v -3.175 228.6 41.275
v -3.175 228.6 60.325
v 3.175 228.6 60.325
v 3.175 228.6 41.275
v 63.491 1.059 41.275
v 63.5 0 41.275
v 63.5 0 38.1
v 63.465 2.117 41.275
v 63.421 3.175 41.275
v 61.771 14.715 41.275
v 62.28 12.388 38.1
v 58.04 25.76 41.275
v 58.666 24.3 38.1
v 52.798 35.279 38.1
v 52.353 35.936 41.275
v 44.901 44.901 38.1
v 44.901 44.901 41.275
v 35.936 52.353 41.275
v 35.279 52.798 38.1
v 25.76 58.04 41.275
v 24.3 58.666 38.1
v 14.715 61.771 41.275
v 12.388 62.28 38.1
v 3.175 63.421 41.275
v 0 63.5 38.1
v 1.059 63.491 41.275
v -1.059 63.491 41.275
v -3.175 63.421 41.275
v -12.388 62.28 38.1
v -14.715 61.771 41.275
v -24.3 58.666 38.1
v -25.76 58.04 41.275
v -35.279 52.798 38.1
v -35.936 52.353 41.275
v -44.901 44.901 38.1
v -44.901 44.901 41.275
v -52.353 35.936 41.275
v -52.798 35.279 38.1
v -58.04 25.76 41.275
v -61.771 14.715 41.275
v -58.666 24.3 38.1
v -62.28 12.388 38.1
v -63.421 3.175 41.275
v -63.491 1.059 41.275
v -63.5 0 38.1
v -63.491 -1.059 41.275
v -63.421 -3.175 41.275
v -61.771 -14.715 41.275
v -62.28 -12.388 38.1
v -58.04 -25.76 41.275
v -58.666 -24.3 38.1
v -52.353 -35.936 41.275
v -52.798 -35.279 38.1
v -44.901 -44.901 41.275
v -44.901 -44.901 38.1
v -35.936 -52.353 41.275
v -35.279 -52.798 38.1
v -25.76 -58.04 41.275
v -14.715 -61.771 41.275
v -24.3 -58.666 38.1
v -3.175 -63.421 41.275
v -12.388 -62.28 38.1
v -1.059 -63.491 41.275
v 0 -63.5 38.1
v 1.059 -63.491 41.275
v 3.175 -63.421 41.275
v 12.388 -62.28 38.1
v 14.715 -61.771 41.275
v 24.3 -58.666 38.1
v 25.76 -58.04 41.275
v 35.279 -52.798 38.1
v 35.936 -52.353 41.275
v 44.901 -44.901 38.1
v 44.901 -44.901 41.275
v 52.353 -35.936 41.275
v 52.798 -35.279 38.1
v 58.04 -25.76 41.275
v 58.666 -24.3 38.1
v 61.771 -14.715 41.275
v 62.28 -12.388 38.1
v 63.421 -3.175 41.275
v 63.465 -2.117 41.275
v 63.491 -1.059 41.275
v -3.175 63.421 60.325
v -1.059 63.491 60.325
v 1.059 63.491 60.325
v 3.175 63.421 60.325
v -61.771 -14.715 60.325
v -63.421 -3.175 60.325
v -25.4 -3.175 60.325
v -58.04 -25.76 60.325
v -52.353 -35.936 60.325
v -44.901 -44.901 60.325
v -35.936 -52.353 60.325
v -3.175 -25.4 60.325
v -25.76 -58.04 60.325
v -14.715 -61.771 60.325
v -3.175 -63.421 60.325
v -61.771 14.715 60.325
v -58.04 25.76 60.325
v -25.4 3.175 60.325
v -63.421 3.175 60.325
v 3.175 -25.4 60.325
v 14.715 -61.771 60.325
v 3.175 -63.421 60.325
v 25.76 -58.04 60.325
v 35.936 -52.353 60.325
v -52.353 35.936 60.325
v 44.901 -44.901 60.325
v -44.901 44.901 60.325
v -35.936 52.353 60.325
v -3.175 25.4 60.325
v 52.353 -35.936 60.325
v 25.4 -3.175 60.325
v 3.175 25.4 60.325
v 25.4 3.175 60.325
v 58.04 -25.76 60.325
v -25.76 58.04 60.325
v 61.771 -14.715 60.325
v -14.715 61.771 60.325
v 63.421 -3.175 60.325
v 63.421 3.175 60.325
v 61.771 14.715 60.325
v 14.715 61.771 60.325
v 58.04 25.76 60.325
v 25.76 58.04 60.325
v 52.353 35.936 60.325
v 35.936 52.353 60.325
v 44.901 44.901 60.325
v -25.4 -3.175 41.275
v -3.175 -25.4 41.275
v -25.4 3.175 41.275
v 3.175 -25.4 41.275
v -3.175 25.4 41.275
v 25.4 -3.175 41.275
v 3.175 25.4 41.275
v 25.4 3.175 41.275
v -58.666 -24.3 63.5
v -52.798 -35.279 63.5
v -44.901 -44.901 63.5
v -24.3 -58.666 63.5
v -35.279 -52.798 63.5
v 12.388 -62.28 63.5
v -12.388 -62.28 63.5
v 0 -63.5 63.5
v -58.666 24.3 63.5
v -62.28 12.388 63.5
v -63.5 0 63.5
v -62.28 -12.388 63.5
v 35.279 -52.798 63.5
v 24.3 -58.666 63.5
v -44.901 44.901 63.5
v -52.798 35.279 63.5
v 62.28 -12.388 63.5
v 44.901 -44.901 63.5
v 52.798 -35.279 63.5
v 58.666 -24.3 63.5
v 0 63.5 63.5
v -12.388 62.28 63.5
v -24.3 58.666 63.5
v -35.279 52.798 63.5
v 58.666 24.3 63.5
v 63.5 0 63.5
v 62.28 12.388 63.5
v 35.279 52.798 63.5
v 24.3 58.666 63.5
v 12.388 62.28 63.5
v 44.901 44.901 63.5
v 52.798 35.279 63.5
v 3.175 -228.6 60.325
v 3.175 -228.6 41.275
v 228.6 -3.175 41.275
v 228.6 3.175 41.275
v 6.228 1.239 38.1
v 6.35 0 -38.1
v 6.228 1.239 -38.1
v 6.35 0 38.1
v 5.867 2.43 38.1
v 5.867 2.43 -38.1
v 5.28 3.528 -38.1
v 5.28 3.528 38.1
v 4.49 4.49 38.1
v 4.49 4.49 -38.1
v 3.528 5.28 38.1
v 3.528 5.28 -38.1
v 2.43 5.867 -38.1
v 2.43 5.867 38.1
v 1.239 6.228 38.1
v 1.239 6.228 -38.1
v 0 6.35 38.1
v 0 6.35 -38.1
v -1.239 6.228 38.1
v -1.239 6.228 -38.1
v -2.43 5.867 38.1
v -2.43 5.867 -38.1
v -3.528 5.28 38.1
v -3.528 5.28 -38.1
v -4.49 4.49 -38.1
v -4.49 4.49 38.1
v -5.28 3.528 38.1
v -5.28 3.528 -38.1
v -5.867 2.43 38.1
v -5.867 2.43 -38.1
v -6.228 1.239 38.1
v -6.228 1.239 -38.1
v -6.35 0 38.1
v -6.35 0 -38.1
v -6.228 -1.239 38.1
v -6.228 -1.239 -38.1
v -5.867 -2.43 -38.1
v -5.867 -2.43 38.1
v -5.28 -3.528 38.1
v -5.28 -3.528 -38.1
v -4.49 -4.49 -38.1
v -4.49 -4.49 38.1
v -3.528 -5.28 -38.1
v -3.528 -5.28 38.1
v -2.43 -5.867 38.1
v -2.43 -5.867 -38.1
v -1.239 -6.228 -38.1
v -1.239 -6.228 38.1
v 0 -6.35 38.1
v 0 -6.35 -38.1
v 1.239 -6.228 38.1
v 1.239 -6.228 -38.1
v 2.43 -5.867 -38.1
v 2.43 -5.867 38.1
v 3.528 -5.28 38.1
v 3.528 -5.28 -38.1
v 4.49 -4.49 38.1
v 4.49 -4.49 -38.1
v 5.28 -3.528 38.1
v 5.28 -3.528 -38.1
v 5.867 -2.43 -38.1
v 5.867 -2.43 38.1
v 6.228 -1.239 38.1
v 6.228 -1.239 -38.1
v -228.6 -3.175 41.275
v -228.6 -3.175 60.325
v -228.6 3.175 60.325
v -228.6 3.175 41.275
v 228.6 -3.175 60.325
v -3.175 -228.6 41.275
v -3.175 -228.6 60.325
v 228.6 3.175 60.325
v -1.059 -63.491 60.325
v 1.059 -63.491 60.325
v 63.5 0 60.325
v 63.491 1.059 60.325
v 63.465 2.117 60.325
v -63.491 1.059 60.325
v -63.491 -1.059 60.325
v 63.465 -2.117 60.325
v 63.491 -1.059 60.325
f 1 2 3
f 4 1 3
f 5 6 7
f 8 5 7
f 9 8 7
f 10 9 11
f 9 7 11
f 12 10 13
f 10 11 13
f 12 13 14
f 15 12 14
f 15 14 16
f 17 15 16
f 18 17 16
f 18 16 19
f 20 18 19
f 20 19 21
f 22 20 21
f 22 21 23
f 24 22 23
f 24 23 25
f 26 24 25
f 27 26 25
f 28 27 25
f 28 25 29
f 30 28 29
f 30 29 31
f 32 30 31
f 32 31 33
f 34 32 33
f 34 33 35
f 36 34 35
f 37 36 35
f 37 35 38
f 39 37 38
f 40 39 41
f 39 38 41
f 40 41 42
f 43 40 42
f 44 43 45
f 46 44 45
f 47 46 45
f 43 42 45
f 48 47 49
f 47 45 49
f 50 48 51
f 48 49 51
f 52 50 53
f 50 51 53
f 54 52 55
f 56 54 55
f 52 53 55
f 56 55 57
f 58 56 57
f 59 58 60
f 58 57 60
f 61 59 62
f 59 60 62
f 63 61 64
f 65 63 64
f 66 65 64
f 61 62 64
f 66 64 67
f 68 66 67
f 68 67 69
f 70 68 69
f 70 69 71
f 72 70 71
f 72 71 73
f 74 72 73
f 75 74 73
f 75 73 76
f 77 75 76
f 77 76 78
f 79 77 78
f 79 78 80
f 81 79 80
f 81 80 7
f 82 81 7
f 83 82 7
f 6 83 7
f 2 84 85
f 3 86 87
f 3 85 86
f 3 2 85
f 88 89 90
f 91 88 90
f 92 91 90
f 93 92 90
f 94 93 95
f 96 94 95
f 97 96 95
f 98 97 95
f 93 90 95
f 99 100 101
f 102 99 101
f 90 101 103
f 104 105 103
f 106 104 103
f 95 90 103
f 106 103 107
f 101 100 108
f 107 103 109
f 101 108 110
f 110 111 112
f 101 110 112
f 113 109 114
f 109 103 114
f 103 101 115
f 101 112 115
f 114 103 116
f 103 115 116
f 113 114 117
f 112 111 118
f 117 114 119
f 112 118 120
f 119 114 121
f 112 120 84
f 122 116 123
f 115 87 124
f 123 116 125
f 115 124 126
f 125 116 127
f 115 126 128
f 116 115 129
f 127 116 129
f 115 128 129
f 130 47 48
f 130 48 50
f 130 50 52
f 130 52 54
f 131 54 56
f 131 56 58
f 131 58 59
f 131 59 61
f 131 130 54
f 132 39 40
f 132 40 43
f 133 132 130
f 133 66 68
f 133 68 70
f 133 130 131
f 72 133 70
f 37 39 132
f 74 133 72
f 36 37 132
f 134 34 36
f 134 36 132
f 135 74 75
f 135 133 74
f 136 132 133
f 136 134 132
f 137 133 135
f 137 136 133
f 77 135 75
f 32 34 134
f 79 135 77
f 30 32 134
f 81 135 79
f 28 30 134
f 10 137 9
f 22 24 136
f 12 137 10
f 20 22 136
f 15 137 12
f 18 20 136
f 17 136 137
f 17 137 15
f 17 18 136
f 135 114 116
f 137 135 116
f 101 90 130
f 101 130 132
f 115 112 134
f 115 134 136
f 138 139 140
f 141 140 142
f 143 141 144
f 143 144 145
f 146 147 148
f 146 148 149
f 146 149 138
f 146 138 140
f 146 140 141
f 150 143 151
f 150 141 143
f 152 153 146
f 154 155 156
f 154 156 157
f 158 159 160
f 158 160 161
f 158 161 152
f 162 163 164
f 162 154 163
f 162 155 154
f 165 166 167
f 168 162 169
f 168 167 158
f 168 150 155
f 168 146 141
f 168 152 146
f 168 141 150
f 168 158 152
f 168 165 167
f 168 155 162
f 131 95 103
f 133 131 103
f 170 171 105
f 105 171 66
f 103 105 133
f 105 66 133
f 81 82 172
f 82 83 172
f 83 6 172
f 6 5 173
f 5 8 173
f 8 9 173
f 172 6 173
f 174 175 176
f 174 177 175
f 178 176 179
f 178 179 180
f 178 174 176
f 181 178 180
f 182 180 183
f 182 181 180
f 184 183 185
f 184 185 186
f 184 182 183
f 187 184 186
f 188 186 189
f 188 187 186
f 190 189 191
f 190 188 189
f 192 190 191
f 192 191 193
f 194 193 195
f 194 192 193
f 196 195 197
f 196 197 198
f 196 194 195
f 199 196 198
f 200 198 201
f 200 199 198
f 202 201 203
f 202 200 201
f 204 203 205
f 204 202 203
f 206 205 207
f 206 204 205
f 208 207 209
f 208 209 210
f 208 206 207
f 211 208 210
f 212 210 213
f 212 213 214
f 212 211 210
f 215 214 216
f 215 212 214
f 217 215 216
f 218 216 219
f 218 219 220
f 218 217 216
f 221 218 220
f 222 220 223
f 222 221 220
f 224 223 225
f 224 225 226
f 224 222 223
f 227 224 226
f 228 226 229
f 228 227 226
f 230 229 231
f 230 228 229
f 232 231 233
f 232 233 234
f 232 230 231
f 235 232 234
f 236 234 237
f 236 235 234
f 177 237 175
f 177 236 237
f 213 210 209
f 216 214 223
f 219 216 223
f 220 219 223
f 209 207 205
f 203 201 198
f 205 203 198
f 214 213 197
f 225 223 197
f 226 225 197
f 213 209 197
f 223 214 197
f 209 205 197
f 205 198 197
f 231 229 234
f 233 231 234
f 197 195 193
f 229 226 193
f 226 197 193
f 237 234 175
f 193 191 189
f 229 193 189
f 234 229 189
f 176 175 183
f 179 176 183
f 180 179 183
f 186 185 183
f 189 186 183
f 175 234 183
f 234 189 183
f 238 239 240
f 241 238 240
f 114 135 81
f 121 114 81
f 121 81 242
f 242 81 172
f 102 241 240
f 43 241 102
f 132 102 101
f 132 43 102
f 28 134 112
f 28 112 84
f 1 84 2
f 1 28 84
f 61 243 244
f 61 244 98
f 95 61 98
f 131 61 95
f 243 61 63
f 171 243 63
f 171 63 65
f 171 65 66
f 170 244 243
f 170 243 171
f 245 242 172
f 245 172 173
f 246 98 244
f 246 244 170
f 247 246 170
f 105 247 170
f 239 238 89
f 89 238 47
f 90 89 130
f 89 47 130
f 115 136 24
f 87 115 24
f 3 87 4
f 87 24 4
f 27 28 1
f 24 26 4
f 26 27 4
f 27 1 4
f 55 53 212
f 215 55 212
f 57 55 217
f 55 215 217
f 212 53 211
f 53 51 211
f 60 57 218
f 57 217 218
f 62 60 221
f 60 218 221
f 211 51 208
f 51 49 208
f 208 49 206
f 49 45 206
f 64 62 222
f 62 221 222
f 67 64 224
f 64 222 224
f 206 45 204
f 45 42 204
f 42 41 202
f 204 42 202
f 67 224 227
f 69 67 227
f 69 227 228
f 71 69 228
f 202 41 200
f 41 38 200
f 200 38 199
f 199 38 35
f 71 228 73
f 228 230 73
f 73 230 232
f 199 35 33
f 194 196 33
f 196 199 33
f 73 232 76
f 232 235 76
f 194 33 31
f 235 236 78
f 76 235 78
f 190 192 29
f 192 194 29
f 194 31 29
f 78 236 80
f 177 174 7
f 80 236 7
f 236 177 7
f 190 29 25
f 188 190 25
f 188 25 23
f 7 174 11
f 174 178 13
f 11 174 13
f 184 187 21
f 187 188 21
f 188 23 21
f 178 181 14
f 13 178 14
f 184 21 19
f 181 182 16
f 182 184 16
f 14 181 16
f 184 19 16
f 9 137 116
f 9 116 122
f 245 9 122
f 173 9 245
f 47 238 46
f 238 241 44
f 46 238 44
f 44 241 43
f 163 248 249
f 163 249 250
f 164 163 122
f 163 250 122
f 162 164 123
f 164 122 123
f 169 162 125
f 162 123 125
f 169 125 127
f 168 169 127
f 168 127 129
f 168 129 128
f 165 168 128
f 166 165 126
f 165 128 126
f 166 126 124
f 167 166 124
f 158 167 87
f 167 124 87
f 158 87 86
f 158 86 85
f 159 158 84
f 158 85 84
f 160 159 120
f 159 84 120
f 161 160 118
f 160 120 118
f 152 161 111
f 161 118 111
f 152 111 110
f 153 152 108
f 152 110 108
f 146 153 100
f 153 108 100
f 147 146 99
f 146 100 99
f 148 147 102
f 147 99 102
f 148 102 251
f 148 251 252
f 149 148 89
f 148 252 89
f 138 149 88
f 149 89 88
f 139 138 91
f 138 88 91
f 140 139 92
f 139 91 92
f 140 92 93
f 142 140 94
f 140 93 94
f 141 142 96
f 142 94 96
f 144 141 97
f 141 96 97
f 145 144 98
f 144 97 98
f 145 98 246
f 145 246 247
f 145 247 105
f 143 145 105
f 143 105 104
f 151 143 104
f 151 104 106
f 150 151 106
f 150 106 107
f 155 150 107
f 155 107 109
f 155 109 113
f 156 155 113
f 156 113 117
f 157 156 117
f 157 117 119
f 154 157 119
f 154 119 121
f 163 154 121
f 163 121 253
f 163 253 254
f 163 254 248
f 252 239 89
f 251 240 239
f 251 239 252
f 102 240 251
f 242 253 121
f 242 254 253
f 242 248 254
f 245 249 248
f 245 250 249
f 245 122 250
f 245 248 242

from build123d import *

# Parameters (mm, degrees)
F0_R     = 6.35
F1_DEPTH = 38.1
F2_R     = 63.5
F3_DEPTH = 3.175
F4_W     = 6.35
F4_H     = 203.2
F4_W_2   = 203.2
F4_H_2   = 6.35
F5_DEPTH = 19.05
F6_R     = 63.5
F7_DEPTH = 3.175


with BuildPart() as f1:
    # F0 (on Top) → F1 (new body, symmetric)
    with BuildSketch(Plane.XY):
        Circle(F0_R)
    extrude(amount=F1_DEPTH, both=True)



with BuildPart() as f3:
    # F2 (on face) → F3 (new body)
    with BuildSketch(Plane.XY.offset(60.325)):
        Circle(F2_R)
    extrude(amount=F3_DEPTH)

    # F4 (on face) → F5 (join)
    with BuildSketch(Plane.XY.offset(41.275)):
        with Locations((0, 127)):
            Rectangle(F4_W, F4_H)
        with Locations((-127, 0)):
            Rectangle(F4_W_2, F4_H_2)
        with Locations((127, 0)):
            Rectangle(F4_W_2, F4_H_2)
        with Locations((0, -127)):
            Rectangle(F4_W, F4_H)
    extrude(amount=F5_DEPTH)


with BuildPart() as f1_1:
    add(f1.part)

    add(f3.part)  # F7 merges F3
    # F6 (on face) → F7 (join)
    with BuildSketch(Plane.XY.offset(38.1)):
        Circle(F6_R)
    extrude(amount=F7_DEPTH)


solid = f1_1.part
